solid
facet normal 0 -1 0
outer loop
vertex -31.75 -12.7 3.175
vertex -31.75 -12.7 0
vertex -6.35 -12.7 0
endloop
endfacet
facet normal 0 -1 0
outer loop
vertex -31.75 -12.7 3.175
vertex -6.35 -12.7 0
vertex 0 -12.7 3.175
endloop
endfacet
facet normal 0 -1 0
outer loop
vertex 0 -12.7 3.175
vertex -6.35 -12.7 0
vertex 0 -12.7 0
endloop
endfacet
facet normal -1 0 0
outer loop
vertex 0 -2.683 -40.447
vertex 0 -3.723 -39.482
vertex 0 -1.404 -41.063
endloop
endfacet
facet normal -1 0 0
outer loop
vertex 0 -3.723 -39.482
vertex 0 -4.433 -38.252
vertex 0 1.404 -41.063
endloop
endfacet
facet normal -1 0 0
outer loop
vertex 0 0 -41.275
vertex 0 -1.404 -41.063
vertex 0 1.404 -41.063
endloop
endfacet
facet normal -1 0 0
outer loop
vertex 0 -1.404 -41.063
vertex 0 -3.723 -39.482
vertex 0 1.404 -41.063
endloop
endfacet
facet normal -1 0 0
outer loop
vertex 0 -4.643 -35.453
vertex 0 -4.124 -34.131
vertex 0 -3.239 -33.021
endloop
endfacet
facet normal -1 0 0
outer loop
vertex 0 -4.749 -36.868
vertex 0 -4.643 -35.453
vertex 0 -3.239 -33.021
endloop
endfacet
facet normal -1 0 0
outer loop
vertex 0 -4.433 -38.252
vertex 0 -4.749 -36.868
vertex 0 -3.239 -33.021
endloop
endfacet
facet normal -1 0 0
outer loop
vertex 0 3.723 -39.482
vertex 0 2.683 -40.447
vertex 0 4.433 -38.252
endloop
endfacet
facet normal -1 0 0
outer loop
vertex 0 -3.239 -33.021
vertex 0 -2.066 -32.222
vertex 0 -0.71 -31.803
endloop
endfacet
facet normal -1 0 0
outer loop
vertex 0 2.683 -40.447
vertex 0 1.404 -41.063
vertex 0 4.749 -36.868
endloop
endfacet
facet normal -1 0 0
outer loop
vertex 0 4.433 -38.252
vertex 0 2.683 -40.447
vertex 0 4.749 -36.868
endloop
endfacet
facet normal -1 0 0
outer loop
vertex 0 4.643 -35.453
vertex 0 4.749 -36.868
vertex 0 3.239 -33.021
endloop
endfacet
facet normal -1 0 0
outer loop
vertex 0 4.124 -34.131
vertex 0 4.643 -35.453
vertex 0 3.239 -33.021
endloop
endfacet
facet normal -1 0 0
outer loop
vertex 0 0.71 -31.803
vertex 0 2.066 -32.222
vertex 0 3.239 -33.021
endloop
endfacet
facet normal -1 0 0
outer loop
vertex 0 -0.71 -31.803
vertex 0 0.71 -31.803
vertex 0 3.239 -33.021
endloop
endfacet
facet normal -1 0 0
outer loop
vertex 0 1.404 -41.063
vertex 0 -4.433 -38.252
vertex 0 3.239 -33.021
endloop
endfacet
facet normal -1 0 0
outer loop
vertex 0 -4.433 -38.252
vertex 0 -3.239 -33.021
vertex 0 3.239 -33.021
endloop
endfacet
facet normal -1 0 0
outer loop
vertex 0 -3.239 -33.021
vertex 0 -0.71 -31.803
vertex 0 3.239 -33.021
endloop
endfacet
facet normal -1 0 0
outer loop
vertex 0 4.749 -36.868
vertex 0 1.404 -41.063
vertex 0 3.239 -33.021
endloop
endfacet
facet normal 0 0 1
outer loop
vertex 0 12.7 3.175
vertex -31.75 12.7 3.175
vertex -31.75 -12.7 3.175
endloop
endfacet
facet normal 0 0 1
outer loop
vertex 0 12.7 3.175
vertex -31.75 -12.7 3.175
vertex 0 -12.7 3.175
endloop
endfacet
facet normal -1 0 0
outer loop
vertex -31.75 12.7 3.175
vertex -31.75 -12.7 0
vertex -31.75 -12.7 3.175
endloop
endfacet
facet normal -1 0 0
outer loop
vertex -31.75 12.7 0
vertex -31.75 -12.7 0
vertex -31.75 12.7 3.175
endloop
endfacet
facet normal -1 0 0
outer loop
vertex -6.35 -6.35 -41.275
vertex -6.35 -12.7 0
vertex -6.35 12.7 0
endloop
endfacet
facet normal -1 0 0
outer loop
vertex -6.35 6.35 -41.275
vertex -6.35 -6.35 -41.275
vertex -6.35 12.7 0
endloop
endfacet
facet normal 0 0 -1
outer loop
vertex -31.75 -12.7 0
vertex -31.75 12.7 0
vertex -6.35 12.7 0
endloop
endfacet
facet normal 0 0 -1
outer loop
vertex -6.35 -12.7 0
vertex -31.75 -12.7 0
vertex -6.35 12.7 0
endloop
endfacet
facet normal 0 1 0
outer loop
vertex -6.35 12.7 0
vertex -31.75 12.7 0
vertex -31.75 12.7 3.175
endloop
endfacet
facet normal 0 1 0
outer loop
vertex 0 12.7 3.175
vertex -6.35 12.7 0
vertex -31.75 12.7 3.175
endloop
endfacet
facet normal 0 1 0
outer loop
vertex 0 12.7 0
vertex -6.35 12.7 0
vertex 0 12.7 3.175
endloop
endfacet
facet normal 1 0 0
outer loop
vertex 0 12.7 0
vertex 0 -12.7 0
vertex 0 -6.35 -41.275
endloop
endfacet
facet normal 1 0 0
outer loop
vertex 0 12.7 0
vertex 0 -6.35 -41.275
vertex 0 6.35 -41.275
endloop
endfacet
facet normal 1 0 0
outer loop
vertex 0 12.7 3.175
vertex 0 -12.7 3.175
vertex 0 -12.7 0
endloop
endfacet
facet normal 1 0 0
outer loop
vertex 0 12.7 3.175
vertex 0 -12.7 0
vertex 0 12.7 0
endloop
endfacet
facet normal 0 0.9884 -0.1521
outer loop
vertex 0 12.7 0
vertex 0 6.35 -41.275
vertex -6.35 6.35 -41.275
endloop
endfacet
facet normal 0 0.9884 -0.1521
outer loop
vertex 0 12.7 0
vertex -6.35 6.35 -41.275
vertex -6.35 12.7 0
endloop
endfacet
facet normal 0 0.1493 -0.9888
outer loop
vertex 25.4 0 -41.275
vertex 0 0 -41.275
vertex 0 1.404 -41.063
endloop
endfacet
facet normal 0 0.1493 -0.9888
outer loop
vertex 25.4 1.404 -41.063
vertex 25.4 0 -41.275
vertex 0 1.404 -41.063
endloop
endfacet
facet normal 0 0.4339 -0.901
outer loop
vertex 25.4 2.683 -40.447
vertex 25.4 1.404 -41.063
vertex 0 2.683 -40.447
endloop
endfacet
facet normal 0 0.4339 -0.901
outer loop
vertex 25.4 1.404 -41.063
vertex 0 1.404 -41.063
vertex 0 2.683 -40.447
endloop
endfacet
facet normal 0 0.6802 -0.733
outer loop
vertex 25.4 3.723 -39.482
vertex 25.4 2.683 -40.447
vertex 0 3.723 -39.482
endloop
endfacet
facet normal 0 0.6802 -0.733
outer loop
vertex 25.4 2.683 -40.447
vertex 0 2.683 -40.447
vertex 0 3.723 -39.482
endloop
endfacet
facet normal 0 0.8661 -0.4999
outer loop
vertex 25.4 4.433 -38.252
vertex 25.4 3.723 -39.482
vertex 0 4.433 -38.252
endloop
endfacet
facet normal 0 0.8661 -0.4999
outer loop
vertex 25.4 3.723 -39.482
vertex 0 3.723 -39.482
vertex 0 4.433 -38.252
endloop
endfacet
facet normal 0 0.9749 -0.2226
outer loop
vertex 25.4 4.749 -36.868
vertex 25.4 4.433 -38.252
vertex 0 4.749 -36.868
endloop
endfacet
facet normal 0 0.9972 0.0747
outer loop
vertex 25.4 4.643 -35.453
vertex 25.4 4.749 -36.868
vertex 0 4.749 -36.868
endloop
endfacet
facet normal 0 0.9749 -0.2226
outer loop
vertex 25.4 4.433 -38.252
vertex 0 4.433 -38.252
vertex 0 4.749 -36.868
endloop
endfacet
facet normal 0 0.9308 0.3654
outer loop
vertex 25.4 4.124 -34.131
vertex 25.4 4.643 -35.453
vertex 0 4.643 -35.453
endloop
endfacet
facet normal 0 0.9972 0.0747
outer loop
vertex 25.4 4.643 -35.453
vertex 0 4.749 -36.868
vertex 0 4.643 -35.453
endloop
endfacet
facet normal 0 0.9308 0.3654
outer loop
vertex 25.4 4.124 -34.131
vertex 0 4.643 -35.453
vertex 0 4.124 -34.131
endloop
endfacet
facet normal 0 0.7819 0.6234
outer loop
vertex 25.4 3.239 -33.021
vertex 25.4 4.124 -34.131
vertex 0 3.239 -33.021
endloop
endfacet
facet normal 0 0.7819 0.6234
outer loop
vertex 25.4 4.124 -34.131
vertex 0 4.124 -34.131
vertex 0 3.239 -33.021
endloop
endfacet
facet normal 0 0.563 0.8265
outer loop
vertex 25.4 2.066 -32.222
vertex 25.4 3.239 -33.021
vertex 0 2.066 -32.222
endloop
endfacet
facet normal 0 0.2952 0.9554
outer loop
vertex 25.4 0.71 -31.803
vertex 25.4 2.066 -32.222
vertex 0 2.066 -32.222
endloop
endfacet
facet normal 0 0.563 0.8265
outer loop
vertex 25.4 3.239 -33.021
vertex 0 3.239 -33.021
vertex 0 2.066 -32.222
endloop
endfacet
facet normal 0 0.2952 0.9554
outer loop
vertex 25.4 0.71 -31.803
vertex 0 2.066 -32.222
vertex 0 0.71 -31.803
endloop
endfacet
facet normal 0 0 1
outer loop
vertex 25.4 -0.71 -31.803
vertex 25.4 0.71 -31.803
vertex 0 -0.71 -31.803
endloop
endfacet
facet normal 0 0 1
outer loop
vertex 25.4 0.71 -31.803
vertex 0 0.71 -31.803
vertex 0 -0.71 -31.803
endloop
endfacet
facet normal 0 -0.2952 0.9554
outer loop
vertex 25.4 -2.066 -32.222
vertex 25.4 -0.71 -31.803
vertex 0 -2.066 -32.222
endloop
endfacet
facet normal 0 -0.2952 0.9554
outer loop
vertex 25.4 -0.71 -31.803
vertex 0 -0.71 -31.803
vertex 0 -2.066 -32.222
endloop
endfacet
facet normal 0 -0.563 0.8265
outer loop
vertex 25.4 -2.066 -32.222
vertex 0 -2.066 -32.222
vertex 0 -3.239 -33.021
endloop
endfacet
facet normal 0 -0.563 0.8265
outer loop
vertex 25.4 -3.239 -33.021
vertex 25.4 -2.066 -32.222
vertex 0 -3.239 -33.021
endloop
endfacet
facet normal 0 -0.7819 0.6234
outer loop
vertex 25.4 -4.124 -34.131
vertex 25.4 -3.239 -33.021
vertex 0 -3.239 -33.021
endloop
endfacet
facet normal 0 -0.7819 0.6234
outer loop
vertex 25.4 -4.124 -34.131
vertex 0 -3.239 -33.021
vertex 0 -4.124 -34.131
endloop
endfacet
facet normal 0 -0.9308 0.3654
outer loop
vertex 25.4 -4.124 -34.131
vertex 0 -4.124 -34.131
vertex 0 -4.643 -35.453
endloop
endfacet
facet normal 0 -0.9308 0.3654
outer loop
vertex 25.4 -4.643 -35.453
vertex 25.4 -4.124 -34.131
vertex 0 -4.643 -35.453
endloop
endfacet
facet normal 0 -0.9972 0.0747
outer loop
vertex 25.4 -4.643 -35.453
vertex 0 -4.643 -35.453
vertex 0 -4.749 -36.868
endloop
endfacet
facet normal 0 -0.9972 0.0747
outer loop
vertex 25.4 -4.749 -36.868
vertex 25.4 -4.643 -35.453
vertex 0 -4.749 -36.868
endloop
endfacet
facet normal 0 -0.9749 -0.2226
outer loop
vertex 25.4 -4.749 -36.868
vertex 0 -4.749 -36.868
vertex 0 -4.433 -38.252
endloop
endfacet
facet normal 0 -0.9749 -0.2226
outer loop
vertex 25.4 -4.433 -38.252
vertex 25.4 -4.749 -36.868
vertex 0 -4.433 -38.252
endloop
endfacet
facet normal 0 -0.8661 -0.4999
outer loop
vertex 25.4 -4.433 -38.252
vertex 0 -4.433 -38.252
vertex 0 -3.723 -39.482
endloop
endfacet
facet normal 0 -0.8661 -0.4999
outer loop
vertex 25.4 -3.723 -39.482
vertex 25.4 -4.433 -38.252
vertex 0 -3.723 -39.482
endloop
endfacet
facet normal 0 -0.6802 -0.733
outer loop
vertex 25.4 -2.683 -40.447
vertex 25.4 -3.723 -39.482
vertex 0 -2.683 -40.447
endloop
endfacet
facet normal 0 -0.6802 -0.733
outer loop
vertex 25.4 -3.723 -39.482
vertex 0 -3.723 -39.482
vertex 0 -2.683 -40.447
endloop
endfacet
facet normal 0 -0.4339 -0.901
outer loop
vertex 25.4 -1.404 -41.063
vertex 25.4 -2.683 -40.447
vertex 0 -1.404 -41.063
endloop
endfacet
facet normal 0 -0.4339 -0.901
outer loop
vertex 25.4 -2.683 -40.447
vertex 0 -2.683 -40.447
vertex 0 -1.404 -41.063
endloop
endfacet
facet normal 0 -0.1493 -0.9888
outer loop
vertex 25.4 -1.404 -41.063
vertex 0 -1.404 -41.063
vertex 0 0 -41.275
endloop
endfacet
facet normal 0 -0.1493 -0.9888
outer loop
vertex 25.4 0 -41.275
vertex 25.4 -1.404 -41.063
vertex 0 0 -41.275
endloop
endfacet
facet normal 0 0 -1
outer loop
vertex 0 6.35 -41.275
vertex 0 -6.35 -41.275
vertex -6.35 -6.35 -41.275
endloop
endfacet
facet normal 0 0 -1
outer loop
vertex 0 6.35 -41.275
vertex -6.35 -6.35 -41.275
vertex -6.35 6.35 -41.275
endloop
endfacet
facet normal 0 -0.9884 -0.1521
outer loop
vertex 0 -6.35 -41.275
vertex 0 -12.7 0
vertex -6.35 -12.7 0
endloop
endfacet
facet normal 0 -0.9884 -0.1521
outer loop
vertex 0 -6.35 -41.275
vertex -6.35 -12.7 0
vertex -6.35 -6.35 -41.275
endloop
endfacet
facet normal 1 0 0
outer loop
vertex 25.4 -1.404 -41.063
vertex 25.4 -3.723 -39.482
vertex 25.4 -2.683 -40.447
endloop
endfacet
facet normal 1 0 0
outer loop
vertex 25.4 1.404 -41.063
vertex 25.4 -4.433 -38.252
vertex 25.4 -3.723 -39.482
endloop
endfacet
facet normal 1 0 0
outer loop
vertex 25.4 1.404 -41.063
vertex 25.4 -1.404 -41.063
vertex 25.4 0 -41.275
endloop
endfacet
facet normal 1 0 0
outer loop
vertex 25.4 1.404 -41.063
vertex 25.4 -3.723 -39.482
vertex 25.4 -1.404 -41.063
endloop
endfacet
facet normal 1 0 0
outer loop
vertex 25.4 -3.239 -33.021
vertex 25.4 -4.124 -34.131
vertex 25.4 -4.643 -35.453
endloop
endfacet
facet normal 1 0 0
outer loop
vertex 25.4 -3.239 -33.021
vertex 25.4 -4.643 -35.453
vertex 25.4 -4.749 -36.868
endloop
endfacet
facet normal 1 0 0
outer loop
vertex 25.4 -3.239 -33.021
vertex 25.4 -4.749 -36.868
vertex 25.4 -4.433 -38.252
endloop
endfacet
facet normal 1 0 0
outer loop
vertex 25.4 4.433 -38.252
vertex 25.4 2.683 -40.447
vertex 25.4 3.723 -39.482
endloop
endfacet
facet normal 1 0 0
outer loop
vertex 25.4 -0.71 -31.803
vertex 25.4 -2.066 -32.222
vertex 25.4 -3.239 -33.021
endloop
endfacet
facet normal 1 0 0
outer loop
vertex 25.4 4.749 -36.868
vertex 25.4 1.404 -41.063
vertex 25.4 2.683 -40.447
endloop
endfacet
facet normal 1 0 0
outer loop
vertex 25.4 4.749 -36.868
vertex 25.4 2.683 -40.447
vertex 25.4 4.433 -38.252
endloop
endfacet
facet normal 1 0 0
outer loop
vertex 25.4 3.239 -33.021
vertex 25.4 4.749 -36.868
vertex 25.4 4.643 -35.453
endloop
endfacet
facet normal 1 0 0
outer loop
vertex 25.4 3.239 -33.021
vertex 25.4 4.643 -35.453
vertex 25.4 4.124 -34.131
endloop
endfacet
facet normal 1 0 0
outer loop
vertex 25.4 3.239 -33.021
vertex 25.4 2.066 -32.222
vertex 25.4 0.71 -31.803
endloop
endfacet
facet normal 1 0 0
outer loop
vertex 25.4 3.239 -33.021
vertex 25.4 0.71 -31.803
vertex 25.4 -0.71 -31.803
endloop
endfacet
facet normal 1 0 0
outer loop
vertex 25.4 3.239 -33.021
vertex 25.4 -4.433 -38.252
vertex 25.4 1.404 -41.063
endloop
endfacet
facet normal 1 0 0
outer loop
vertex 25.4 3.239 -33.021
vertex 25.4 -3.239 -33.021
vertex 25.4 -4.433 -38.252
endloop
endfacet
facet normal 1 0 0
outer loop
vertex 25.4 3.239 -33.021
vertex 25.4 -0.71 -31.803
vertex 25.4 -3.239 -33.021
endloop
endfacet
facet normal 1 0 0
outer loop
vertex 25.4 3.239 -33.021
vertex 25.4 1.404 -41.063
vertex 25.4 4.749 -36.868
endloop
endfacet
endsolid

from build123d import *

# Parameters (mm, degrees)
F0_W     = 31.75
F0_H     = 25.4
F2_DEPTH = 3.175
F3_DEPTH = 6.35
F4_DEPTH = 25.4


# Not quite as in the source:
# - a length typed as a fraction of an inch, garbled in the dataset ("3 / 203.2 mm" for 3/8 in), is restored
# - a feature names something its author has since deleted; it is built from what else it names


with BuildPart() as f2:
    # F0 (on Top) → F2 (new body)
    with BuildSketch(Plane.XY):
        with Locations((-15.875, 0)):
            Rectangle(F0_W, F0_H)
    extrude(amount=F2_DEPTH)

    # F1 (on Right) → F3 (join)
    with BuildSketch(Plane.YZ):
        Polygon((12.7, 0), (-12.7, 0), (-6.35, -41.275), (0, -41.275), (6.35, -41.275), align=None)
        with BuildLine():
            ThreePointArc((4.7625, -36.5125), (3.3675960454, -39.8800960454), (0, -41.275))
            ThreePointArc((0, -41.275), (-3.3675960454, -33.1449039546), (4.7625, -36.5125))
        make_face(mode=Mode.SUBTRACT)
        with BuildLine():
            ThreePointArc((4.7625, -36.5125), (-3.3675960454, -33.1449039546), (0, -41.275))
            ThreePointArc((0, -41.275), (3.3675960454, -39.8800960454), (4.7625, -36.5125))
        make_face()
    extrude(amount=-F3_DEPTH)


with BuildPart() as f4:
    # F1 (on Right) → F4 (new body)
    with BuildSketch(Plane.YZ):
        with BuildLine():
            ThreePointArc((4.7625, -36.5125), (-3.3675960454, -33.1449039546), (0, -41.275))
            ThreePointArc((0, -41.275), (3.3675960454, -39.8800960454), (4.7625, -36.5125))
        make_face()
    extrude(amount=F4_DEPTH)


solid = Compound([f2.part, f4.part])
